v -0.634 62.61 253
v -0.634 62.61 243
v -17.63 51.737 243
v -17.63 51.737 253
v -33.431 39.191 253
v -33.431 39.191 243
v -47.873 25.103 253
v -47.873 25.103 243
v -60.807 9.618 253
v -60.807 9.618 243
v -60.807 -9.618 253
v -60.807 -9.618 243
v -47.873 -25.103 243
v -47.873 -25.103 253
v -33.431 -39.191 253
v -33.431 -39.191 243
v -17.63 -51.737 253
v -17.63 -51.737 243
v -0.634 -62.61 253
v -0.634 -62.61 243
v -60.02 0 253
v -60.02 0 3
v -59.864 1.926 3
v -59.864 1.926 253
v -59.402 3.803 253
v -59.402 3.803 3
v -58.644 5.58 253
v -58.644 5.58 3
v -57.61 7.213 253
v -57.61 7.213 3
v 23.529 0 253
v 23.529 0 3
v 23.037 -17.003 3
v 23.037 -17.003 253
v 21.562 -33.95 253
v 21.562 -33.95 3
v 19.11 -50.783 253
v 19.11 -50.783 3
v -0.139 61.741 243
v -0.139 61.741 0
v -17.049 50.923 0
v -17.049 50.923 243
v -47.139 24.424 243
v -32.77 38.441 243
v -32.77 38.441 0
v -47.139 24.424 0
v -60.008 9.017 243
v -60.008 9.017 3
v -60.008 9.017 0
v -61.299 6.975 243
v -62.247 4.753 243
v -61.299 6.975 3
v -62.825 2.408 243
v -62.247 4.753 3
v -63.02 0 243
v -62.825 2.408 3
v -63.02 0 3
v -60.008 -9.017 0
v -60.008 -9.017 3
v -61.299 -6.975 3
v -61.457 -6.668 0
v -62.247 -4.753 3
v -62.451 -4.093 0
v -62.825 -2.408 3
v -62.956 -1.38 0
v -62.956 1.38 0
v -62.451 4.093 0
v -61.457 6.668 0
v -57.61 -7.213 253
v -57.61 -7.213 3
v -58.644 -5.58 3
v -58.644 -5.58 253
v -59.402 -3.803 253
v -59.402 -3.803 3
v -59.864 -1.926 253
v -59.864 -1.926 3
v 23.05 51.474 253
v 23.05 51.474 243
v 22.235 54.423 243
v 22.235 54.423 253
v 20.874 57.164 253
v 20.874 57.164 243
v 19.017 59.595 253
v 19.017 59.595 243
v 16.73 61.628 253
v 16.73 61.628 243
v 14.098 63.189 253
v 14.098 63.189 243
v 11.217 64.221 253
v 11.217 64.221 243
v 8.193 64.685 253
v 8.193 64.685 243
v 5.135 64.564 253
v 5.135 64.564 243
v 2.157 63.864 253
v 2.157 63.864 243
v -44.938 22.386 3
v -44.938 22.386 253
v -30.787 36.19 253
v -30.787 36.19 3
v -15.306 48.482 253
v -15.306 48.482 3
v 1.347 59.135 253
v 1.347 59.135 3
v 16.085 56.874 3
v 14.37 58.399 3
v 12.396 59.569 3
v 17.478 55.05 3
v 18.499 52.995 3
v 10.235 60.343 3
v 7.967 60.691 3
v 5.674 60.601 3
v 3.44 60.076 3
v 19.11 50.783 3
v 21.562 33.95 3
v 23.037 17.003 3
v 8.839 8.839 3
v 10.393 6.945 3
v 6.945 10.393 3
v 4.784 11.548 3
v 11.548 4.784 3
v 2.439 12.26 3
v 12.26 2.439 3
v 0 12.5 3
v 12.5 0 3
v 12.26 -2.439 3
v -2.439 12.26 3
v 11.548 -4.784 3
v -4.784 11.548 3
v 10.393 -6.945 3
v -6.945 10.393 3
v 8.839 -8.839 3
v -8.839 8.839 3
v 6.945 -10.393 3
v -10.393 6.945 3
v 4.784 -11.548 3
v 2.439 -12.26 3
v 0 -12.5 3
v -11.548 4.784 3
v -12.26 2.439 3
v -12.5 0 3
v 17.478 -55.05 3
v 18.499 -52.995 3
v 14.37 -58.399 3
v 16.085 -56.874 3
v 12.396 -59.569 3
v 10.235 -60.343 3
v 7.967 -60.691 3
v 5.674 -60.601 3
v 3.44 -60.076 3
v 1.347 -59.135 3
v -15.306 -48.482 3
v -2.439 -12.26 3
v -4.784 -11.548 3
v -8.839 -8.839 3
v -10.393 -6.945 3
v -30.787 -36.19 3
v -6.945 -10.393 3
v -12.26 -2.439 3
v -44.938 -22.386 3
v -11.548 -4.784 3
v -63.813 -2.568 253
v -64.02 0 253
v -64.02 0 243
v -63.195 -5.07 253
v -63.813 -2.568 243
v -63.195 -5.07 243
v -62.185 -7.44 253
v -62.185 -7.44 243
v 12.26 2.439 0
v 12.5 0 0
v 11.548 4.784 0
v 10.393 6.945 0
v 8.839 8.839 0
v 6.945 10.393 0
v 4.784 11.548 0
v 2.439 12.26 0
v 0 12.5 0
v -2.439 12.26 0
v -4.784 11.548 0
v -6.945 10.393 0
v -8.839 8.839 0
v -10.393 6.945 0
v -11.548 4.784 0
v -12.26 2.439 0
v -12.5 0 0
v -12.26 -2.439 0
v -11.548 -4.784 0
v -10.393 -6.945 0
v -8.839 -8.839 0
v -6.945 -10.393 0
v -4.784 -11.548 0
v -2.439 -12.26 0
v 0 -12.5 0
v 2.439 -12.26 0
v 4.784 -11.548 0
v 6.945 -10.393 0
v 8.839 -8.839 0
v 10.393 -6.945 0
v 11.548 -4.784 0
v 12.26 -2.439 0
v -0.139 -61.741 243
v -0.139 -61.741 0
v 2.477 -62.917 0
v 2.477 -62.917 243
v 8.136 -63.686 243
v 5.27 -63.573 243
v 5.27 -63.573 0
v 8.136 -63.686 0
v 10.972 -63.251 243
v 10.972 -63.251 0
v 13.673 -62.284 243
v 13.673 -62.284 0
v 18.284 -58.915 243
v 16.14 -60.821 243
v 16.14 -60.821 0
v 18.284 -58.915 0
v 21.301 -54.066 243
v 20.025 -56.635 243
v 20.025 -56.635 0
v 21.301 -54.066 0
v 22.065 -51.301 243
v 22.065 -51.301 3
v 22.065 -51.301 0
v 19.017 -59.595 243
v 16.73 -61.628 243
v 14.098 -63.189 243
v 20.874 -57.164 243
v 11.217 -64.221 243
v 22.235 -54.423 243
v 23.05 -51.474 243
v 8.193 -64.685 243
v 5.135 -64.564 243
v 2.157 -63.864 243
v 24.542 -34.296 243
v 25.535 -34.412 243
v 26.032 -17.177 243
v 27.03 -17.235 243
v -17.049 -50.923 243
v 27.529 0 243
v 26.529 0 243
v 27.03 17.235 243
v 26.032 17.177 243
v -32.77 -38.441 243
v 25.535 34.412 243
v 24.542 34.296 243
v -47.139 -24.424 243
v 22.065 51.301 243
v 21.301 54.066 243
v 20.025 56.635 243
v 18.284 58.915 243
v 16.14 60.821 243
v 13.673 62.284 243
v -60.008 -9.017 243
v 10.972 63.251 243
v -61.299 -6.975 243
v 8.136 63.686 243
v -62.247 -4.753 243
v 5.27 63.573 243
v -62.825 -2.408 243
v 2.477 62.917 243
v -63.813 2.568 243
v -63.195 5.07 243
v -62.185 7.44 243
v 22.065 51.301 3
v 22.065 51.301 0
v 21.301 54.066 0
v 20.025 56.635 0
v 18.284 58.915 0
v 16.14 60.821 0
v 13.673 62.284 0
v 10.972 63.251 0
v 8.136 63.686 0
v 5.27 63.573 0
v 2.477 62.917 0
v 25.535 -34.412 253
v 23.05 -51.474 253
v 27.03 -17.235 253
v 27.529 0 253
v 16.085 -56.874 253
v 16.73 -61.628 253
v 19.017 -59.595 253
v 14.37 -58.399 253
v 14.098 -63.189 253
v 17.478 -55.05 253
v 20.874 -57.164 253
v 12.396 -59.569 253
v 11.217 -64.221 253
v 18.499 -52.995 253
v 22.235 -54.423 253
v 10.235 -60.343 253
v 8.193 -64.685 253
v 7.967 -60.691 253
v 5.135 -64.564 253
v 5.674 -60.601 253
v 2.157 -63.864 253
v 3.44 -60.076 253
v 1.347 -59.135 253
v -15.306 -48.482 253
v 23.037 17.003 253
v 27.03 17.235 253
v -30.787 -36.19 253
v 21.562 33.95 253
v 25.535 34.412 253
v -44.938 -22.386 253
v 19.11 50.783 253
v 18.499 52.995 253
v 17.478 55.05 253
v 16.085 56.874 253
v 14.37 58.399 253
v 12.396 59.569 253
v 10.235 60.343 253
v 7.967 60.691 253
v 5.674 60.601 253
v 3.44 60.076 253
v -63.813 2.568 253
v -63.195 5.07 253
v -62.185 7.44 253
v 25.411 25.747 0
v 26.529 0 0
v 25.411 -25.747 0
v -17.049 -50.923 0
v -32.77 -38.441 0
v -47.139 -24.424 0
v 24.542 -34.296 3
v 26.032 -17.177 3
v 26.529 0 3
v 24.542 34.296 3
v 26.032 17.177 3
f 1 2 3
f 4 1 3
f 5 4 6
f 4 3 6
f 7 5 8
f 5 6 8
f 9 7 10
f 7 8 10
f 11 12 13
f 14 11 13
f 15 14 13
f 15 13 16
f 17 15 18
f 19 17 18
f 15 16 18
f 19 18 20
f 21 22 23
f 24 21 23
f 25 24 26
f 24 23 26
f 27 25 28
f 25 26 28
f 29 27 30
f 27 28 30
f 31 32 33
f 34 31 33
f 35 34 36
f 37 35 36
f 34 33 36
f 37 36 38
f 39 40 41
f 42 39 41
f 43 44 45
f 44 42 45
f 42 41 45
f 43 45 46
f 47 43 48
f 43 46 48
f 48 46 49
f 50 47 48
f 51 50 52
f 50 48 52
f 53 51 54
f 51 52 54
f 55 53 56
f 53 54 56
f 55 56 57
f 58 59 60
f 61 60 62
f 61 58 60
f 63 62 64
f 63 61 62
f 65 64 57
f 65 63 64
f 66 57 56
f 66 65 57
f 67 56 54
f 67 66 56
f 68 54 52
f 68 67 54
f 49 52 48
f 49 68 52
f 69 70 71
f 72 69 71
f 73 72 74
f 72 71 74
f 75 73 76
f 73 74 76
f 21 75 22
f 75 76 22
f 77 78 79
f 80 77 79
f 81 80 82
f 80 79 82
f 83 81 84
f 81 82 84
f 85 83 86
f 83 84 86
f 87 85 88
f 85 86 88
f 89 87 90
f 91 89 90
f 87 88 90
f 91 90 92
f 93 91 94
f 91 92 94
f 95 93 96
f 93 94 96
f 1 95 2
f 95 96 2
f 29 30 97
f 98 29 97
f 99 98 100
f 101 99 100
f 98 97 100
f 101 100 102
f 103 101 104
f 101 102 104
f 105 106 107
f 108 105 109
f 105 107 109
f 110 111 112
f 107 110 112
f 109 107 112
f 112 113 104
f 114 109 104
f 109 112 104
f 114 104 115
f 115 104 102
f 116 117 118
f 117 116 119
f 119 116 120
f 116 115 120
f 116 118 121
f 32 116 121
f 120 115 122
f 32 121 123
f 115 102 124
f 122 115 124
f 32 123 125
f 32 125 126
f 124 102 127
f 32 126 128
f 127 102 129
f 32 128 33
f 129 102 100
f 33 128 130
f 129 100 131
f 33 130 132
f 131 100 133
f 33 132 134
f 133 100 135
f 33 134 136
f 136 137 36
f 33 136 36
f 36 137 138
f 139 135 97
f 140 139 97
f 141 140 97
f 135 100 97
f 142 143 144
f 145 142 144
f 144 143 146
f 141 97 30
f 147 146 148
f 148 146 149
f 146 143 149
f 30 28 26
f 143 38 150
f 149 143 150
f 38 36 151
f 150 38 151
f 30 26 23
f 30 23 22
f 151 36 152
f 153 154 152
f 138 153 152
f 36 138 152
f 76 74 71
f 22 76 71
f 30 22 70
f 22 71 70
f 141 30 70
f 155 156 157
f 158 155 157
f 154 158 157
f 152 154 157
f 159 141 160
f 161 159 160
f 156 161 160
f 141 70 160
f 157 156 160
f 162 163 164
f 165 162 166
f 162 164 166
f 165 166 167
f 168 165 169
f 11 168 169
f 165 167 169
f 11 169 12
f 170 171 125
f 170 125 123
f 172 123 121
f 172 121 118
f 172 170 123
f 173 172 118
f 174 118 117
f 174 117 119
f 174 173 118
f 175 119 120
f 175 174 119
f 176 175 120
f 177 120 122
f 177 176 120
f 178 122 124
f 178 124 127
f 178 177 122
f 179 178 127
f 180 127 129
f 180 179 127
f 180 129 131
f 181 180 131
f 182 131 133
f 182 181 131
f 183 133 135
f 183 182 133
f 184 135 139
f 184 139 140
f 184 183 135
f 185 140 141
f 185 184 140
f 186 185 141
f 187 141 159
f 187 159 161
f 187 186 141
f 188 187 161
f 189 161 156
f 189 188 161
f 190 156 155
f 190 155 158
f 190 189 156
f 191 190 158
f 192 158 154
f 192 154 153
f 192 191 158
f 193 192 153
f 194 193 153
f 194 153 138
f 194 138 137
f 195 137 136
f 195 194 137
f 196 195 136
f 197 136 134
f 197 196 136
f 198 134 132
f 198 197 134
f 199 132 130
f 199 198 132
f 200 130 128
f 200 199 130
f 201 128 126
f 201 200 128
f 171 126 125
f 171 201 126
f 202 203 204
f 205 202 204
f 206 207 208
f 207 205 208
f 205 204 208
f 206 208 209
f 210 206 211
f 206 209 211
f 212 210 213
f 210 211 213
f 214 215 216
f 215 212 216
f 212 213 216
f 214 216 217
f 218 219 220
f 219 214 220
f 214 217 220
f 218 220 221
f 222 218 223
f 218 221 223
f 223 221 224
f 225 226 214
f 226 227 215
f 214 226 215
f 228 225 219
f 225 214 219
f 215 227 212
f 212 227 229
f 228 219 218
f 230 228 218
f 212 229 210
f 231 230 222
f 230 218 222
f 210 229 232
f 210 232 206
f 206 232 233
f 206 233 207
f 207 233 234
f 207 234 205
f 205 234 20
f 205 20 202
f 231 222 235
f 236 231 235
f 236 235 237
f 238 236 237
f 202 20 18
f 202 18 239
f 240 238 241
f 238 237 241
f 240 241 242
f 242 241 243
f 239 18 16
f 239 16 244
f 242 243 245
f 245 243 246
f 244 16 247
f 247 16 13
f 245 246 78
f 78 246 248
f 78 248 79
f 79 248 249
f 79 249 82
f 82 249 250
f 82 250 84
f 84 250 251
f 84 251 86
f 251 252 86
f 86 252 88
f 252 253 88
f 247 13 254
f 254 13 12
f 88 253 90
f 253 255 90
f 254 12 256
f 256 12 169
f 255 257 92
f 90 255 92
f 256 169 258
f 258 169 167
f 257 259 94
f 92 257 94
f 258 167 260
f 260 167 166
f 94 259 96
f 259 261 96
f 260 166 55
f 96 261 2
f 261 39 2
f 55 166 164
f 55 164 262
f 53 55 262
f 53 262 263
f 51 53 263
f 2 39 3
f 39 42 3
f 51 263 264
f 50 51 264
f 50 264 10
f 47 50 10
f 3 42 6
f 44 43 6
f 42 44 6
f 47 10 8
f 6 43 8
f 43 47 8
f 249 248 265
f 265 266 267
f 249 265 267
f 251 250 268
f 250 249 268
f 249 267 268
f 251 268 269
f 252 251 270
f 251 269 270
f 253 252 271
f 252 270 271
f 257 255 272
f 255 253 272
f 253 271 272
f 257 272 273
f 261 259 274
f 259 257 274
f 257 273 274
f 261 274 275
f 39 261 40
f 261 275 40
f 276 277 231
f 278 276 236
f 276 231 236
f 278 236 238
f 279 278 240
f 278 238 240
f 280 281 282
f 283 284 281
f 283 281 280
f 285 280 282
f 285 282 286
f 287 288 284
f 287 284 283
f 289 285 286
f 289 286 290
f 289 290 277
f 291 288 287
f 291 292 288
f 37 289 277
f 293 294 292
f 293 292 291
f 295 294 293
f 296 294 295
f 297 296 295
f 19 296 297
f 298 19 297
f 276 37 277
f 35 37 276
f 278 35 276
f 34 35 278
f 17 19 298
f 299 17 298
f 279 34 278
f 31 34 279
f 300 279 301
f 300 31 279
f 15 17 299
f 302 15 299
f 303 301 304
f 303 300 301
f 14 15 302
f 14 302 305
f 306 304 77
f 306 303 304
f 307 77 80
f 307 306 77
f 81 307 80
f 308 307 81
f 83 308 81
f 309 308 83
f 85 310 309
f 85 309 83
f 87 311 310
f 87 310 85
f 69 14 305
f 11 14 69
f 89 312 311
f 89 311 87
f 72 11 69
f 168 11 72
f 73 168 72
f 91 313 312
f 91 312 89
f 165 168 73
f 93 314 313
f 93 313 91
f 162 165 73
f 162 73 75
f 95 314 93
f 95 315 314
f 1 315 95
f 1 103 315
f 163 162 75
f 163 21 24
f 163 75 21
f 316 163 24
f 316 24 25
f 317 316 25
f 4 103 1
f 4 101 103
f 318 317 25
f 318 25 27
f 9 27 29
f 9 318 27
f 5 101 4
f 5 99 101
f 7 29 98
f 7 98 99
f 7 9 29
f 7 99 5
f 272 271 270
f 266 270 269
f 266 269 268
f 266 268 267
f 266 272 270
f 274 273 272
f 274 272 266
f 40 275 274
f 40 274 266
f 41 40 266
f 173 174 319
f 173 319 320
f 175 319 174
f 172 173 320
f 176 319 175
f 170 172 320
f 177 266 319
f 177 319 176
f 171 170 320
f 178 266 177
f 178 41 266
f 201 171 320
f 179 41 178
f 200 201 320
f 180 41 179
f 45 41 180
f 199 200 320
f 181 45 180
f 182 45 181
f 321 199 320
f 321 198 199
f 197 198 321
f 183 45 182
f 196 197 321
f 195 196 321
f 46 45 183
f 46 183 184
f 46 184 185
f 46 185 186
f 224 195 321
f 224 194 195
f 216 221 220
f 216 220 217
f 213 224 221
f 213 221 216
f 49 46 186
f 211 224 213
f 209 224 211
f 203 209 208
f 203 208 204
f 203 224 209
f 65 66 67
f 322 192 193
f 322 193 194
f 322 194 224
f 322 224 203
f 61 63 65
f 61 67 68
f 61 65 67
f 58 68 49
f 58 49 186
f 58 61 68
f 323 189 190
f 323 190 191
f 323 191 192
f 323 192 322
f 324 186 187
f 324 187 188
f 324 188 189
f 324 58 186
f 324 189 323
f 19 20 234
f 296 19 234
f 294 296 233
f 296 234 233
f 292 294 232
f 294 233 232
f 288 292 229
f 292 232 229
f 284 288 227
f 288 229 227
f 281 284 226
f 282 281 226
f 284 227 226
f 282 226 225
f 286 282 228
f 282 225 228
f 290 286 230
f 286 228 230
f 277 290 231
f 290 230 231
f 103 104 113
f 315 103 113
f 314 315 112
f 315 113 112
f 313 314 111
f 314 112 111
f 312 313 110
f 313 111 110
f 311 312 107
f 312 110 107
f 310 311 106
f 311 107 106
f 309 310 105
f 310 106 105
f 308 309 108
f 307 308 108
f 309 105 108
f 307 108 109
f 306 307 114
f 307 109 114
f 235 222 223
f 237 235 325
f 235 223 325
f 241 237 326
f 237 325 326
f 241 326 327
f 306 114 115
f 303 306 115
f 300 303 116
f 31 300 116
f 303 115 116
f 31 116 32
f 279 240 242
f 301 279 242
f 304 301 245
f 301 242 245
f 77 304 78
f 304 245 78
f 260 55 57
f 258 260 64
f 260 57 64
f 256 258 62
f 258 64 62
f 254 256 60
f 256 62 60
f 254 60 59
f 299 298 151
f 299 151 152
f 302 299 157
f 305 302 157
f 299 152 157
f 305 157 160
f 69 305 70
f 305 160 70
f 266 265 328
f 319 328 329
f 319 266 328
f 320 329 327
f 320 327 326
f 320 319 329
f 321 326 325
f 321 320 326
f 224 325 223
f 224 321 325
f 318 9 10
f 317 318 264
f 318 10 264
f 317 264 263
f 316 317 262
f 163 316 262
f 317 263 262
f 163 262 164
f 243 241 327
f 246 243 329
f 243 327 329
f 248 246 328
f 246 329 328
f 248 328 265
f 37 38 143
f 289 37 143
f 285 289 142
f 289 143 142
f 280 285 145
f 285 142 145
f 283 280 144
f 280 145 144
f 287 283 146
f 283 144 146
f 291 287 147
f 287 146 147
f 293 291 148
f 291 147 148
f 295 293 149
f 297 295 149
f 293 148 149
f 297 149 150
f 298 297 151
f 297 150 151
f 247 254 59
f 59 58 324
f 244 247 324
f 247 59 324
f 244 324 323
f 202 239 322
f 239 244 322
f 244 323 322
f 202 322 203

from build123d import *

# Parameters (mm, degrees)
SKETCH1_R           = 12.5
BOSS_EXTRUDE1_DEPTH = 3
BOSS_EXTRUDE2_START = 3
BOSS_EXTRUDE2_DEPTH = 250
BOSS_EXTRUDE3_START = 243
BOSS_EXTRUDE3_DEPTH = 10


with BuildPart() as part:
    # Sketch1 → Boss-Extrude1 (new body)
    with BuildSketch(Plane(origin=(0, 0, 0), x_dir=(0, 1, 0), z_dir=(0, 0, 1))):
        with BuildLine():
            ThreePointArc((-61.741065417, 0.13908703), (-38.440978301, 32.77013475), (-9.016504978, 60.007603513))
            ThreePointArc((-9.016504978, 60.007603513), (0, 63.02), (9.016504978, 60.007603513))
            ThreePointArc((9.016504978, 60.007603513), (38.440978301, 32.77013475), (61.741065417, 0.13908703))
            ThreePointArc((61.741065417, 0.13908703), (62.284318697, -13.672622652), (51.300957447, -22.064536863))
            ThreePointArc((51.300957447, -22.064536863), (0, -26.52870698), (-51.300957447, -22.064536863))
            ThreePointArc((-51.300957447, -22.064536863), (-62.284318697, -13.672622652), (-61.741065417, 0.13908703))
        make_face()
        with Locations(Location((0, 0, 0), (0, 0, 270))):
            Circle(SKETCH1_R, mode=Mode.SUBTRACT)
    extrude(amount=BOSS_EXTRUDE1_DEPTH)

    # Sketch1<3> → Boss-Extrude2 (add)
    with BuildSketch(Plane(origin=(0, 0, 0), x_dir=(0, 1, 0), z_dir=(0, 0, 1)).offset(BOSS_EXTRUDE2_START)):
        with BuildLine():
            Line((0, 60.02), (0, 63.02))
            ThreePointArc((0, 63.02), (-4.75320667, 62.246982335), (-9.016504978, 60.007603513))
            ThreePointArc((-9.016504978, 60.007603513), (-38.440978301, 32.77013475), (-61.741065417, 0.13908703))
            ThreePointArc((-61.741065417, 0.13908703), (-62.284318697, -13.672622652), (-51.300957447, -22.064536863))
            ThreePointArc((-51.300957447, -22.064536863), (-25.747412733, -25.410559647), (0, -26.52870698))
            Line((0, -26.52870698), (0, -23.52870698))
            ThreePointArc((0, -23.52870698), (-25.487337857, -22.421854065), (-50.782765957, -19.10962949))
            ThreePointArc((-50.782765957, -19.10962949), (-59.569454957, -12.396098122), (-59.134852334, -1.346730376))
            ThreePointArc((-59.134852334, -1.346730376), (-36.189588879, 30.787397836), (-7.213203982, 57.610082811))
            ThreePointArc((-7.213203982, 57.610082811), (-3.802565336, 59.401585868), (0, 60.02))
        make_face()
        with BuildLine():
            ThreePointArc((9.016504978, 60.007603513), (4.75320667, 62.246982335), (0, 63.02))
            Line((0, 63.02), (0, 60.02))
            ThreePointArc((0, 60.02), (3.802565336, 59.401585868), (7.213203982, 57.610082811))
            ThreePointArc((7.213203982, 57.610082811), (36.189588879, 30.787397836), (59.134852334, -1.346730376))
            ThreePointArc((59.134852334, -1.346730376), (59.569454957, -12.396098122), (50.782765957, -19.10962949))
            ThreePointArc((50.782765957, -19.10962949), (25.487337857, -22.421854065), (0, -23.52870698))
            Line((0, -23.52870698), (0, -26.52870698))
            ThreePointArc((0, -26.52870698), (25.747412733, -25.410559647), (51.300957447, -22.064536863))
            ThreePointArc((51.300957447, -22.064536863), (62.284318697, -13.672622652), (61.741065417, 0.13908703))
            ThreePointArc((61.741065417, 0.13908703), (38.440978301, 32.77013475), (9.016504978, 60.007603513))
        make_face()
    extrude(amount=BOSS_EXTRUDE2_DEPTH)

    # Sketch1<4> → Boss-Extrude3 (add)
    with BuildSketch(Plane(origin=(0, 0, 0), x_dir=(0, 1, 0), z_dir=(0, 0, 1)).offset(BOSS_EXTRUDE3_START)):
        with BuildLine():
            Line((0, 63.02), (0, 64.02))
            ThreePointArc((0, 64.02), (-5.070087115, 63.195447824), (-9.617605309, 60.806777081))
            ThreePointArc((-9.617605309, 60.806777081), (-39.191441441, 33.431047055), (-62.609803112, 0.634359498))
            ThreePointArc((-62.609803112, 0.634359498), (-63.189273276, -14.098130829), (-51.473687943, -23.049505987))
            ThreePointArc((-51.473687943, -23.049505987), (-25.834104358, -26.406794841), (0, -27.52870698))
            Line((0, -27.52870698), (0, -26.52870698))
            ThreePointArc((0, -26.52870698), (-25.747412733, -25.410559647), (-51.300957447, -22.064536863))
            ThreePointArc((-51.300957447, -22.064536863), (-62.284318697, -13.672622652), (-61.741065417, 0.13908703))
            ThreePointArc((-61.741065417, 0.13908703), (-38.440978301, 32.77013475), (-9.016504978, 60.007603513))
            ThreePointArc((-9.016504978, 60.007603513), (-4.75320667, 62.246982335), (0, 63.02))
        make_face()
        with BuildLine():
            ThreePointArc((9.617605309, 60.806777081), (5.070087115, 63.195447824), (0, 64.02))
            Line((0, 64.02), (0, 63.02))
            ThreePointArc((0, 63.02), (4.75320667, 62.246982335), (9.016504978, 60.007603513))
            ThreePointArc((9.016504978, 60.007603513), (38.440978301, 32.77013475), (61.741065417, 0.13908703))
            ThreePointArc((61.741065417, 0.13908703), (62.284318697, -13.672622652), (51.300957447, -22.064536863))
            ThreePointArc((51.300957447, -22.064536863), (25.747412733, -25.410559647), (0, -26.52870698))
            Line((0, -26.52870698), (0, -27.52870698))
            ThreePointArc((0, -27.52870698), (25.834104358, -26.406794841), (51.473687943, -23.049505987))
            ThreePointArc((51.473687943, -23.049505987), (63.189273276, -14.098130829), (62.609803112, 0.634359498))
            ThreePointArc((62.609803112, 0.634359498), (39.191441441, 33.431047055), (9.617605309, 60.806777081))
        make_face()
    extrude(amount=BOSS_EXTRUDE3_DEPTH)


solid = part.part
